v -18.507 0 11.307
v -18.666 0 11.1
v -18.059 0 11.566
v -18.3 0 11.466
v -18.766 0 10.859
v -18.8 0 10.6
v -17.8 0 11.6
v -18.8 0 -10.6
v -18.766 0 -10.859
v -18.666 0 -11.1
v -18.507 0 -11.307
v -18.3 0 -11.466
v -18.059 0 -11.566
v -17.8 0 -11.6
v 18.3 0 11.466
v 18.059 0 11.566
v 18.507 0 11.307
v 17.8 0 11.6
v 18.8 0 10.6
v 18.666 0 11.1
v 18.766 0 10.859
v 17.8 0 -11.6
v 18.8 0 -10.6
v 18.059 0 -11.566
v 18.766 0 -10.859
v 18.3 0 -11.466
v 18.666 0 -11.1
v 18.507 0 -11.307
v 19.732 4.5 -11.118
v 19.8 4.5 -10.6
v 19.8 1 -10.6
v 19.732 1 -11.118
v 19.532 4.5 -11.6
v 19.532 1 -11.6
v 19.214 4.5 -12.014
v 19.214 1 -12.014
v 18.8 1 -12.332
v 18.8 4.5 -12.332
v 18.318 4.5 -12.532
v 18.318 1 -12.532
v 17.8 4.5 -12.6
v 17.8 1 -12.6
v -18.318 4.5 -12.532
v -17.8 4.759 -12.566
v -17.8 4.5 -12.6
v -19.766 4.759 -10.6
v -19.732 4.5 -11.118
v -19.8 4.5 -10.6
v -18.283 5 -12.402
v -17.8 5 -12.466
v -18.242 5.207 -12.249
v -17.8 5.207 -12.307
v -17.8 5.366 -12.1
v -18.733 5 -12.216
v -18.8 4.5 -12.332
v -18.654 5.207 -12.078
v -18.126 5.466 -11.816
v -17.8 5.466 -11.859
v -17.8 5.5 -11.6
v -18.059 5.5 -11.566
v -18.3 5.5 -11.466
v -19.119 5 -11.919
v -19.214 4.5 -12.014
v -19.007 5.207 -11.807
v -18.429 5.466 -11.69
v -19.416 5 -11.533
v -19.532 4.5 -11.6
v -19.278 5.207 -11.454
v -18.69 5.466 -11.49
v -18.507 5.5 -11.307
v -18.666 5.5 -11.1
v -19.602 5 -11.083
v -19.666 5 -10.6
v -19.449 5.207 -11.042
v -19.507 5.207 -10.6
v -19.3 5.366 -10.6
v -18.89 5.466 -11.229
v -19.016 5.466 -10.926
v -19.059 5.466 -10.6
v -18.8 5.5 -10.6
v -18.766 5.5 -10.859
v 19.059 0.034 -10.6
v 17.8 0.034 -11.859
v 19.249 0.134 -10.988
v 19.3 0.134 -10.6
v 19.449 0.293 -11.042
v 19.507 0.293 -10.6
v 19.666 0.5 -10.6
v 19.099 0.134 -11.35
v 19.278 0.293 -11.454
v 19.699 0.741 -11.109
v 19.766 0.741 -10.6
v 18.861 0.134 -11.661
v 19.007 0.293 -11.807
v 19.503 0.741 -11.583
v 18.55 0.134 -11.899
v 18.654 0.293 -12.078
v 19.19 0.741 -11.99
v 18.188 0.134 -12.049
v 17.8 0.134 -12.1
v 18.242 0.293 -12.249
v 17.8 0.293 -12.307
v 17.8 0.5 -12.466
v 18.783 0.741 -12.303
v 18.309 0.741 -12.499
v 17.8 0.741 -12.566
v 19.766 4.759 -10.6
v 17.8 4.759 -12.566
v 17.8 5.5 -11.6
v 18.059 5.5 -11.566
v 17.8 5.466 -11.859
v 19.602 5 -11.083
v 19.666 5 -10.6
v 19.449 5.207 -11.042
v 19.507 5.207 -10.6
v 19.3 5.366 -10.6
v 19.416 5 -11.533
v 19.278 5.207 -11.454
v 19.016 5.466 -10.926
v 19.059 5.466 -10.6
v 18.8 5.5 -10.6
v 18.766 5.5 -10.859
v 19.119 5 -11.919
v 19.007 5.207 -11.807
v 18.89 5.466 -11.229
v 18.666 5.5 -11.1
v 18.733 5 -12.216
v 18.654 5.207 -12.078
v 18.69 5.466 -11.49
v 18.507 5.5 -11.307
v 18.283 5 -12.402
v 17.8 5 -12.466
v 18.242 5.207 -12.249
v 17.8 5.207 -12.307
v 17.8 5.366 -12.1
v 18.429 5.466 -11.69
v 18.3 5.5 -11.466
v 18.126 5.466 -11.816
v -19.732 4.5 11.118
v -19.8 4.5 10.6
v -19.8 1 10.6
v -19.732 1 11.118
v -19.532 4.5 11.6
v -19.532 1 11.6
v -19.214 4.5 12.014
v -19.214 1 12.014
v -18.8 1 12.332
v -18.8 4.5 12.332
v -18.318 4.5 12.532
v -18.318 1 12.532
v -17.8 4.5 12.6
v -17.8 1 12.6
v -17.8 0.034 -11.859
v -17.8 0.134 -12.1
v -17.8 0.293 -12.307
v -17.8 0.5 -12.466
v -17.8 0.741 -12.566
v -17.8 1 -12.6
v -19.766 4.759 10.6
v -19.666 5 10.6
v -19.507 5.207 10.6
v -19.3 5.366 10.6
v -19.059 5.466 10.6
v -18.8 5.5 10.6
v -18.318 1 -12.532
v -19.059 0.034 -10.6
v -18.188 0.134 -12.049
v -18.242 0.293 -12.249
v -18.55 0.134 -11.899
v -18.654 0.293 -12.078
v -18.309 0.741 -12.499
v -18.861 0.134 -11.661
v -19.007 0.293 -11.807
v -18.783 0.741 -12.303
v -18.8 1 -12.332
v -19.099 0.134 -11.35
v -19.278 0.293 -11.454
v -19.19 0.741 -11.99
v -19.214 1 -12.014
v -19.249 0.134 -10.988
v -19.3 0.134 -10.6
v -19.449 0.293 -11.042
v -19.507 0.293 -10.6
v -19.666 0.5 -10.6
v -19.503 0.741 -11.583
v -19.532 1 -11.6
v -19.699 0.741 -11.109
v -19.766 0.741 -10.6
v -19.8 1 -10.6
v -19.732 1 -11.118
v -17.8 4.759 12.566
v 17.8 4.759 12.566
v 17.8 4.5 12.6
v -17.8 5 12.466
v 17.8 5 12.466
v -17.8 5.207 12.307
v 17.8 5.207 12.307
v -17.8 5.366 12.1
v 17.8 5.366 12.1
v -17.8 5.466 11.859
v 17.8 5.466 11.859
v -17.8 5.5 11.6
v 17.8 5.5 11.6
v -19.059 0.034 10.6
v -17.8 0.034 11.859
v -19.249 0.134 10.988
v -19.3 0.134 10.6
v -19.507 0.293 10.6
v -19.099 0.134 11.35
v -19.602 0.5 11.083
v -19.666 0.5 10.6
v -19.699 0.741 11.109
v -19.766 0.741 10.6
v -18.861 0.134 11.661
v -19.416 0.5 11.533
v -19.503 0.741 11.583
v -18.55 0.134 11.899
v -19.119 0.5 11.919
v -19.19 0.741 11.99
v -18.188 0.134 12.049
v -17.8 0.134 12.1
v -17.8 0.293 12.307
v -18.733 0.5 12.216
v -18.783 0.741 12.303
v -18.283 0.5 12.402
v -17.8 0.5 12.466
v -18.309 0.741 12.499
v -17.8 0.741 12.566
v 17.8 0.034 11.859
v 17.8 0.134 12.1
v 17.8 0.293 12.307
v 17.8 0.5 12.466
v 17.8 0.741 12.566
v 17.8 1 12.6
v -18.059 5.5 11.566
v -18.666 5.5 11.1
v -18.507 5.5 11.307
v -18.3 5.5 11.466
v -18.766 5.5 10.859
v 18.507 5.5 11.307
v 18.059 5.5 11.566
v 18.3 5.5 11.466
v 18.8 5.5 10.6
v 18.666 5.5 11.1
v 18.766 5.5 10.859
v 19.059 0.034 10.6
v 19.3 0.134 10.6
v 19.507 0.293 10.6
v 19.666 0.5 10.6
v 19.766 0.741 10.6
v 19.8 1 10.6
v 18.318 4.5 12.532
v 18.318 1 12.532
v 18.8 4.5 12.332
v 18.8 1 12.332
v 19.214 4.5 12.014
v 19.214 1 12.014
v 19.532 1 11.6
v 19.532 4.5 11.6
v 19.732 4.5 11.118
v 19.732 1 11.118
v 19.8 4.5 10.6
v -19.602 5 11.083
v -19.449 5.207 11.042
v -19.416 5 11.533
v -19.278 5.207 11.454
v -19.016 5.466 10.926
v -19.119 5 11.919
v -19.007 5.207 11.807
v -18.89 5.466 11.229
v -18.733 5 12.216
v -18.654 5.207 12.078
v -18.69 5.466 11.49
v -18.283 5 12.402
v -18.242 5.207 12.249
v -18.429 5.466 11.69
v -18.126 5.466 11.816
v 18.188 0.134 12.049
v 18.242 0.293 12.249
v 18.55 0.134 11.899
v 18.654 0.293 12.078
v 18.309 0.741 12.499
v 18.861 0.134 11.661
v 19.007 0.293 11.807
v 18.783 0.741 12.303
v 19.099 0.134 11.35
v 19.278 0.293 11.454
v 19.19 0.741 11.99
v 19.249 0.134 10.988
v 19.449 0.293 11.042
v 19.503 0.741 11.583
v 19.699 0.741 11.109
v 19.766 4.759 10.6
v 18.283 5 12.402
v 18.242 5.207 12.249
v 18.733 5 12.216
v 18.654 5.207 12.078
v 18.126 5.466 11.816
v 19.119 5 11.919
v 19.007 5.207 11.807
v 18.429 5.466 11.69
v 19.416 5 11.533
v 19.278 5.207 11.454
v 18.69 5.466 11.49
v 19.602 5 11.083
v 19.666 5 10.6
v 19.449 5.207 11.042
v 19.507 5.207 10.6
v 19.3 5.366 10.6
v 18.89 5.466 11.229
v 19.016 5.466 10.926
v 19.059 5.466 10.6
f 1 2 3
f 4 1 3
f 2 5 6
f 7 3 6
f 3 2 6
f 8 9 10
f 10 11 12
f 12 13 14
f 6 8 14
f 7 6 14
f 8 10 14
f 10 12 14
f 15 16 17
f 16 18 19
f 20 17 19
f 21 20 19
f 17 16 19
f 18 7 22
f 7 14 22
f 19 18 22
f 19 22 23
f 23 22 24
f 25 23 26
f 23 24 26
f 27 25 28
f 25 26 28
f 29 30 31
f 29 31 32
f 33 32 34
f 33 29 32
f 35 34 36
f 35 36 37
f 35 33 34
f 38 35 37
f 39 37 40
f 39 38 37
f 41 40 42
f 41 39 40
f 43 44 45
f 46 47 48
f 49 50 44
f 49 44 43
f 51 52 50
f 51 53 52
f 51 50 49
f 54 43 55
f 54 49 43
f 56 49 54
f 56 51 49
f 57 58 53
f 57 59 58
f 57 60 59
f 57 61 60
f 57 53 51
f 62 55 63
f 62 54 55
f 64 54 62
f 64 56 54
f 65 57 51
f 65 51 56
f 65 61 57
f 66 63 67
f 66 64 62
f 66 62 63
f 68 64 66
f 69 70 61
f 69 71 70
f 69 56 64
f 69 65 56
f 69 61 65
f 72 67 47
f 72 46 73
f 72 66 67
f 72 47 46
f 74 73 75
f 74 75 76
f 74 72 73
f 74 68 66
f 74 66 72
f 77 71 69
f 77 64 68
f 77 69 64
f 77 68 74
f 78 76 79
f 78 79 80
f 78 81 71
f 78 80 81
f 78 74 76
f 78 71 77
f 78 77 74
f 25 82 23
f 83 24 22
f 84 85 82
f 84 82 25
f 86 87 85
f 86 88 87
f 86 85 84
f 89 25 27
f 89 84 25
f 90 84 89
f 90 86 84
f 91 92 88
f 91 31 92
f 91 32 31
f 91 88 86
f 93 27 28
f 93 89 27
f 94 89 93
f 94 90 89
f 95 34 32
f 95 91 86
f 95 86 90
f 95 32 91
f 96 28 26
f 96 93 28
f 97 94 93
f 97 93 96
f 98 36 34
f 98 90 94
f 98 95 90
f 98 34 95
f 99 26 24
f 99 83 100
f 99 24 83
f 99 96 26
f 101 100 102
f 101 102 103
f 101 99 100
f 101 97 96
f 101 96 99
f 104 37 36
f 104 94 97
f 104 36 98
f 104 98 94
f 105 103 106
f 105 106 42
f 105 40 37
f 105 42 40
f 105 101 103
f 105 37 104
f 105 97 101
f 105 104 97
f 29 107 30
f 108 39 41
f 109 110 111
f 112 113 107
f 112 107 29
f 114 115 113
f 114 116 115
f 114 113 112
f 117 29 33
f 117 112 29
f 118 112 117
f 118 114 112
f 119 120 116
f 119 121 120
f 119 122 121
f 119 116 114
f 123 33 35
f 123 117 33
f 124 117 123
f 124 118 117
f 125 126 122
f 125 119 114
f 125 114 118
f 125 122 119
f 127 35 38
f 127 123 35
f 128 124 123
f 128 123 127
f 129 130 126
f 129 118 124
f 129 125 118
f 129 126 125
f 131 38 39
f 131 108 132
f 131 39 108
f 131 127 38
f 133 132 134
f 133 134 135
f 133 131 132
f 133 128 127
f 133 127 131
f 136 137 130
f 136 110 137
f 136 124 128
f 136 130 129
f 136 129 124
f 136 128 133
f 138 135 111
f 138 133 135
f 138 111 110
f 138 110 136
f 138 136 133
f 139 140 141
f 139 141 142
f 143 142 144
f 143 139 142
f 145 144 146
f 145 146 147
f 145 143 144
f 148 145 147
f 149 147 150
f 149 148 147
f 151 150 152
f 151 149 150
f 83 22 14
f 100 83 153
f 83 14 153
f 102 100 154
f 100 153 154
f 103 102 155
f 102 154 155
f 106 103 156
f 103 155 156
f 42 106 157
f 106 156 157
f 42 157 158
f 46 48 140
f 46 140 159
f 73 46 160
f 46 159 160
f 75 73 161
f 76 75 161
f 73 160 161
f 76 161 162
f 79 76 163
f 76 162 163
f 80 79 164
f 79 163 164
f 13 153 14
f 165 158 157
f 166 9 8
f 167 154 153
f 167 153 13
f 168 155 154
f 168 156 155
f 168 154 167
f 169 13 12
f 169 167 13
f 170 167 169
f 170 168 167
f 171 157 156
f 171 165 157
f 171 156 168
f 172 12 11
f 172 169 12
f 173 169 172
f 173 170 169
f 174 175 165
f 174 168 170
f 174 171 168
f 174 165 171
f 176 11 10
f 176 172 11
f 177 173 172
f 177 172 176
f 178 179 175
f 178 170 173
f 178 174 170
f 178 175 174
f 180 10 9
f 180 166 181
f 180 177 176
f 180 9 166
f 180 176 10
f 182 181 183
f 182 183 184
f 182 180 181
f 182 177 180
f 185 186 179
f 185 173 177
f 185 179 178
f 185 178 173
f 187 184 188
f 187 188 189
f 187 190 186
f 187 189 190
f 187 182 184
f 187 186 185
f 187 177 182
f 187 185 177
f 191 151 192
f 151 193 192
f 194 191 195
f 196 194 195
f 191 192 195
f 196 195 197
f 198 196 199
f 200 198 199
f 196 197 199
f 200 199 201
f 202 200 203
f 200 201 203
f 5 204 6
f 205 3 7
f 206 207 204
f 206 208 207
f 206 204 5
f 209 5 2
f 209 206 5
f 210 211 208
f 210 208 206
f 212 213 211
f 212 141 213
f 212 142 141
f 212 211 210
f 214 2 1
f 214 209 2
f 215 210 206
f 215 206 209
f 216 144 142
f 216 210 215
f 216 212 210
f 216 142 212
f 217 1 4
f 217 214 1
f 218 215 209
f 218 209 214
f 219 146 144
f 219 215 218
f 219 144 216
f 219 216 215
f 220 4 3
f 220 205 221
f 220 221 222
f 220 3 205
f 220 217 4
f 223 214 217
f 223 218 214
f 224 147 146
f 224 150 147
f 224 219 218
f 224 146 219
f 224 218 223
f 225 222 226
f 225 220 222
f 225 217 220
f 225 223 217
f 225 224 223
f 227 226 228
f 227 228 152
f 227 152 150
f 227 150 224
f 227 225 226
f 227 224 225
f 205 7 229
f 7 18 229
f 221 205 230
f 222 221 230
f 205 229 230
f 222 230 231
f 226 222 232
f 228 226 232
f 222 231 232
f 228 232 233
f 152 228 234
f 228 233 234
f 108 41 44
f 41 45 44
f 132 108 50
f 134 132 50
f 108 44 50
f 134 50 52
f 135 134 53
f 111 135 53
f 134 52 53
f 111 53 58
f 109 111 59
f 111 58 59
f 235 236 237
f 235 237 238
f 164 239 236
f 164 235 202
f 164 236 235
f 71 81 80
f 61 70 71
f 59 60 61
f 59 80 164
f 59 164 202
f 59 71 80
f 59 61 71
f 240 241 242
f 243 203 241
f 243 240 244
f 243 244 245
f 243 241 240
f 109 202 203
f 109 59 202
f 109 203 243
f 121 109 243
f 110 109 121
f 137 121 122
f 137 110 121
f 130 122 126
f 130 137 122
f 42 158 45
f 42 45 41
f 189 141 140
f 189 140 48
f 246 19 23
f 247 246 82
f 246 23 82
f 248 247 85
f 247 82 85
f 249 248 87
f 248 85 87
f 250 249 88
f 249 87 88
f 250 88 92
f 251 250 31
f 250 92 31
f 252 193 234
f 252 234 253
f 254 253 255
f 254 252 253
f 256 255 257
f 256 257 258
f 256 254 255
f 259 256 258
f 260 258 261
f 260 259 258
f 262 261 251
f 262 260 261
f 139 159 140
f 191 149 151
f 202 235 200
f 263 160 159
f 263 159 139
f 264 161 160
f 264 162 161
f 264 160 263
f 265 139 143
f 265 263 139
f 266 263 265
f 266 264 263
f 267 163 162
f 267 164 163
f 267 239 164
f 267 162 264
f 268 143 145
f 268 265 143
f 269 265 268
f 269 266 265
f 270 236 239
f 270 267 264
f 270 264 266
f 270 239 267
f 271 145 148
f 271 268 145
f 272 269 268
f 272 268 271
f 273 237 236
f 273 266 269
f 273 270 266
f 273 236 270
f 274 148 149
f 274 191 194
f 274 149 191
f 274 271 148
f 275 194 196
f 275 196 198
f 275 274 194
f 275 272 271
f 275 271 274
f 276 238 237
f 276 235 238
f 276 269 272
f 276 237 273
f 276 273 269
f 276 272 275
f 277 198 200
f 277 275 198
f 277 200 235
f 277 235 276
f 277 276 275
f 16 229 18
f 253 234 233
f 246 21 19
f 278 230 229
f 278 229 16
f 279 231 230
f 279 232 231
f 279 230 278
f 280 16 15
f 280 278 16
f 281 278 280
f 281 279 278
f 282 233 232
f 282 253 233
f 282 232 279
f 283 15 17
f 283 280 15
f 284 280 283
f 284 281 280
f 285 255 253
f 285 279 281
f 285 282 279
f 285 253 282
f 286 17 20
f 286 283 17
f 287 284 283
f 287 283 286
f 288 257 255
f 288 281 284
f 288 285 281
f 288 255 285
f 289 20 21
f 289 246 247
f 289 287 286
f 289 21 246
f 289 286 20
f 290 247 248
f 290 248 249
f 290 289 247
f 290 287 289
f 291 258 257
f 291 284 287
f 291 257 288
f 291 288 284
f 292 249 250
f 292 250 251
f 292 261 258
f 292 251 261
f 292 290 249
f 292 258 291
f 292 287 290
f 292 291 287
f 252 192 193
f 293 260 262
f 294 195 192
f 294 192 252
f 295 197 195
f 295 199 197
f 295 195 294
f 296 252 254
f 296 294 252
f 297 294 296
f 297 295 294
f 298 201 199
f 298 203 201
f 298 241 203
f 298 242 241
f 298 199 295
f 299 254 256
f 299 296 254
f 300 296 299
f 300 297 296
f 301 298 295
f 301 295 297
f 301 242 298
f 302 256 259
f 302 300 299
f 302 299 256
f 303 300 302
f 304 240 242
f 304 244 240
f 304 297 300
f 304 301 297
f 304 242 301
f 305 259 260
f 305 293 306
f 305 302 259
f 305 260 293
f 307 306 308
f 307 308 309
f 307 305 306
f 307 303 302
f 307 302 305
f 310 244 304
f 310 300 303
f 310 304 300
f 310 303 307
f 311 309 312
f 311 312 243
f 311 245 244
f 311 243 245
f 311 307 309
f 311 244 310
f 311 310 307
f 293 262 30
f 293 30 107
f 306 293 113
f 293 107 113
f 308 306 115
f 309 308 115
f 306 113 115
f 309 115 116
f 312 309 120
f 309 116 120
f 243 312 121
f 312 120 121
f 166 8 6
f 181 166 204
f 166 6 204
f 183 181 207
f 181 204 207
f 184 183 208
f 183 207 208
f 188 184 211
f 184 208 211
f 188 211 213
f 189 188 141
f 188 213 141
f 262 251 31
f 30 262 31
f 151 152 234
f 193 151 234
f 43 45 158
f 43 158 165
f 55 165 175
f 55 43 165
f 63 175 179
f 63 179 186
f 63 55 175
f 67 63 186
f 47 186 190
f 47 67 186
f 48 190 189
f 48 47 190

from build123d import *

# Parameters (mm, degrees)
CROQUIS1_W              = 39.6
CROQUIS1_H              = 25.2
SALIENTE_EXTRUIR1_DEPTH = 5.5
REDONDEO1_R             = 2
REDONDEO2_R             = 2
REDONDEO3_R             = 2
REDONDEO4_R             = 2
REDONDEO5_R             = 1


with BuildPart() as part:
    # Croquis1 → Saliente-Extruir1 (new body)
    with BuildSketch(Plane(origin=(0, 0, 0), x_dir=(1, 0, 0), z_dir=(0, 1, 0))):
        Rectangle(CROQUIS1_W, CROQUIS1_H)
    extrude(amount=SALIENTE_EXTRUIR1_DEPTH)

    # Redondeo1
    redondeo1_edges = [part.edges().sort_by_distance(p)[0] for p in [
        (-19.8, 2.75, 12.6),
    ]]
    fillet(redondeo1_edges, radius=REDONDEO1_R)

    # Redondeo2
    redondeo2_edges = [part.edges().sort_by_distance(p)[0] for p in [
        (19.8, 2.75, 12.6),
    ]]
    fillet(redondeo2_edges, radius=REDONDEO2_R)

    # Redondeo3
    redondeo3_edges = [part.edges().sort_by_distance(p)[0] for p in [
        (19.8, 2.75, -12.6),
    ]]
    fillet(redondeo3_edges, radius=REDONDEO3_R)

    # Redondeo4
    redondeo4_edges = [part.edges().sort_by_distance(p)[0] for p in [
        (-19.8, 2.75, -12.6),
    ]]
    fillet(redondeo4_edges, radius=REDONDEO4_R)

    # Redondeo5
    redondeo5_edges = [part.edges().sort_by_distance(p)[0] for p in [
        (0, 0, 12.6),
        (0, 5.5, 12.6),
        (-19.214213562, 0, 12.014213562),
        (-19.214213562, 5.5, 12.014213562),
        (19.8, 0, 0),
        (19.8, 5.5, 0),
        (19.214213562, 0, 12.014213562),
        (19.214213562, 5.5, 12.014213562),
        (0, 0, -12.6),
        (0, 5.5, -12.6),
        (19.214213562, 0, -12.014213562),
        (19.214213562, 5.5, -12.014213562),
        (-19.8, 0, 0),
        (-19.8, 5.5, 0),
        (-19.214213562, 0, -12.014213562),
        (-19.214213562, 5.5, -12.014213562),
    ]]
    fillet(redondeo5_edges, radius=REDONDEO5_R)


solid = part.part
